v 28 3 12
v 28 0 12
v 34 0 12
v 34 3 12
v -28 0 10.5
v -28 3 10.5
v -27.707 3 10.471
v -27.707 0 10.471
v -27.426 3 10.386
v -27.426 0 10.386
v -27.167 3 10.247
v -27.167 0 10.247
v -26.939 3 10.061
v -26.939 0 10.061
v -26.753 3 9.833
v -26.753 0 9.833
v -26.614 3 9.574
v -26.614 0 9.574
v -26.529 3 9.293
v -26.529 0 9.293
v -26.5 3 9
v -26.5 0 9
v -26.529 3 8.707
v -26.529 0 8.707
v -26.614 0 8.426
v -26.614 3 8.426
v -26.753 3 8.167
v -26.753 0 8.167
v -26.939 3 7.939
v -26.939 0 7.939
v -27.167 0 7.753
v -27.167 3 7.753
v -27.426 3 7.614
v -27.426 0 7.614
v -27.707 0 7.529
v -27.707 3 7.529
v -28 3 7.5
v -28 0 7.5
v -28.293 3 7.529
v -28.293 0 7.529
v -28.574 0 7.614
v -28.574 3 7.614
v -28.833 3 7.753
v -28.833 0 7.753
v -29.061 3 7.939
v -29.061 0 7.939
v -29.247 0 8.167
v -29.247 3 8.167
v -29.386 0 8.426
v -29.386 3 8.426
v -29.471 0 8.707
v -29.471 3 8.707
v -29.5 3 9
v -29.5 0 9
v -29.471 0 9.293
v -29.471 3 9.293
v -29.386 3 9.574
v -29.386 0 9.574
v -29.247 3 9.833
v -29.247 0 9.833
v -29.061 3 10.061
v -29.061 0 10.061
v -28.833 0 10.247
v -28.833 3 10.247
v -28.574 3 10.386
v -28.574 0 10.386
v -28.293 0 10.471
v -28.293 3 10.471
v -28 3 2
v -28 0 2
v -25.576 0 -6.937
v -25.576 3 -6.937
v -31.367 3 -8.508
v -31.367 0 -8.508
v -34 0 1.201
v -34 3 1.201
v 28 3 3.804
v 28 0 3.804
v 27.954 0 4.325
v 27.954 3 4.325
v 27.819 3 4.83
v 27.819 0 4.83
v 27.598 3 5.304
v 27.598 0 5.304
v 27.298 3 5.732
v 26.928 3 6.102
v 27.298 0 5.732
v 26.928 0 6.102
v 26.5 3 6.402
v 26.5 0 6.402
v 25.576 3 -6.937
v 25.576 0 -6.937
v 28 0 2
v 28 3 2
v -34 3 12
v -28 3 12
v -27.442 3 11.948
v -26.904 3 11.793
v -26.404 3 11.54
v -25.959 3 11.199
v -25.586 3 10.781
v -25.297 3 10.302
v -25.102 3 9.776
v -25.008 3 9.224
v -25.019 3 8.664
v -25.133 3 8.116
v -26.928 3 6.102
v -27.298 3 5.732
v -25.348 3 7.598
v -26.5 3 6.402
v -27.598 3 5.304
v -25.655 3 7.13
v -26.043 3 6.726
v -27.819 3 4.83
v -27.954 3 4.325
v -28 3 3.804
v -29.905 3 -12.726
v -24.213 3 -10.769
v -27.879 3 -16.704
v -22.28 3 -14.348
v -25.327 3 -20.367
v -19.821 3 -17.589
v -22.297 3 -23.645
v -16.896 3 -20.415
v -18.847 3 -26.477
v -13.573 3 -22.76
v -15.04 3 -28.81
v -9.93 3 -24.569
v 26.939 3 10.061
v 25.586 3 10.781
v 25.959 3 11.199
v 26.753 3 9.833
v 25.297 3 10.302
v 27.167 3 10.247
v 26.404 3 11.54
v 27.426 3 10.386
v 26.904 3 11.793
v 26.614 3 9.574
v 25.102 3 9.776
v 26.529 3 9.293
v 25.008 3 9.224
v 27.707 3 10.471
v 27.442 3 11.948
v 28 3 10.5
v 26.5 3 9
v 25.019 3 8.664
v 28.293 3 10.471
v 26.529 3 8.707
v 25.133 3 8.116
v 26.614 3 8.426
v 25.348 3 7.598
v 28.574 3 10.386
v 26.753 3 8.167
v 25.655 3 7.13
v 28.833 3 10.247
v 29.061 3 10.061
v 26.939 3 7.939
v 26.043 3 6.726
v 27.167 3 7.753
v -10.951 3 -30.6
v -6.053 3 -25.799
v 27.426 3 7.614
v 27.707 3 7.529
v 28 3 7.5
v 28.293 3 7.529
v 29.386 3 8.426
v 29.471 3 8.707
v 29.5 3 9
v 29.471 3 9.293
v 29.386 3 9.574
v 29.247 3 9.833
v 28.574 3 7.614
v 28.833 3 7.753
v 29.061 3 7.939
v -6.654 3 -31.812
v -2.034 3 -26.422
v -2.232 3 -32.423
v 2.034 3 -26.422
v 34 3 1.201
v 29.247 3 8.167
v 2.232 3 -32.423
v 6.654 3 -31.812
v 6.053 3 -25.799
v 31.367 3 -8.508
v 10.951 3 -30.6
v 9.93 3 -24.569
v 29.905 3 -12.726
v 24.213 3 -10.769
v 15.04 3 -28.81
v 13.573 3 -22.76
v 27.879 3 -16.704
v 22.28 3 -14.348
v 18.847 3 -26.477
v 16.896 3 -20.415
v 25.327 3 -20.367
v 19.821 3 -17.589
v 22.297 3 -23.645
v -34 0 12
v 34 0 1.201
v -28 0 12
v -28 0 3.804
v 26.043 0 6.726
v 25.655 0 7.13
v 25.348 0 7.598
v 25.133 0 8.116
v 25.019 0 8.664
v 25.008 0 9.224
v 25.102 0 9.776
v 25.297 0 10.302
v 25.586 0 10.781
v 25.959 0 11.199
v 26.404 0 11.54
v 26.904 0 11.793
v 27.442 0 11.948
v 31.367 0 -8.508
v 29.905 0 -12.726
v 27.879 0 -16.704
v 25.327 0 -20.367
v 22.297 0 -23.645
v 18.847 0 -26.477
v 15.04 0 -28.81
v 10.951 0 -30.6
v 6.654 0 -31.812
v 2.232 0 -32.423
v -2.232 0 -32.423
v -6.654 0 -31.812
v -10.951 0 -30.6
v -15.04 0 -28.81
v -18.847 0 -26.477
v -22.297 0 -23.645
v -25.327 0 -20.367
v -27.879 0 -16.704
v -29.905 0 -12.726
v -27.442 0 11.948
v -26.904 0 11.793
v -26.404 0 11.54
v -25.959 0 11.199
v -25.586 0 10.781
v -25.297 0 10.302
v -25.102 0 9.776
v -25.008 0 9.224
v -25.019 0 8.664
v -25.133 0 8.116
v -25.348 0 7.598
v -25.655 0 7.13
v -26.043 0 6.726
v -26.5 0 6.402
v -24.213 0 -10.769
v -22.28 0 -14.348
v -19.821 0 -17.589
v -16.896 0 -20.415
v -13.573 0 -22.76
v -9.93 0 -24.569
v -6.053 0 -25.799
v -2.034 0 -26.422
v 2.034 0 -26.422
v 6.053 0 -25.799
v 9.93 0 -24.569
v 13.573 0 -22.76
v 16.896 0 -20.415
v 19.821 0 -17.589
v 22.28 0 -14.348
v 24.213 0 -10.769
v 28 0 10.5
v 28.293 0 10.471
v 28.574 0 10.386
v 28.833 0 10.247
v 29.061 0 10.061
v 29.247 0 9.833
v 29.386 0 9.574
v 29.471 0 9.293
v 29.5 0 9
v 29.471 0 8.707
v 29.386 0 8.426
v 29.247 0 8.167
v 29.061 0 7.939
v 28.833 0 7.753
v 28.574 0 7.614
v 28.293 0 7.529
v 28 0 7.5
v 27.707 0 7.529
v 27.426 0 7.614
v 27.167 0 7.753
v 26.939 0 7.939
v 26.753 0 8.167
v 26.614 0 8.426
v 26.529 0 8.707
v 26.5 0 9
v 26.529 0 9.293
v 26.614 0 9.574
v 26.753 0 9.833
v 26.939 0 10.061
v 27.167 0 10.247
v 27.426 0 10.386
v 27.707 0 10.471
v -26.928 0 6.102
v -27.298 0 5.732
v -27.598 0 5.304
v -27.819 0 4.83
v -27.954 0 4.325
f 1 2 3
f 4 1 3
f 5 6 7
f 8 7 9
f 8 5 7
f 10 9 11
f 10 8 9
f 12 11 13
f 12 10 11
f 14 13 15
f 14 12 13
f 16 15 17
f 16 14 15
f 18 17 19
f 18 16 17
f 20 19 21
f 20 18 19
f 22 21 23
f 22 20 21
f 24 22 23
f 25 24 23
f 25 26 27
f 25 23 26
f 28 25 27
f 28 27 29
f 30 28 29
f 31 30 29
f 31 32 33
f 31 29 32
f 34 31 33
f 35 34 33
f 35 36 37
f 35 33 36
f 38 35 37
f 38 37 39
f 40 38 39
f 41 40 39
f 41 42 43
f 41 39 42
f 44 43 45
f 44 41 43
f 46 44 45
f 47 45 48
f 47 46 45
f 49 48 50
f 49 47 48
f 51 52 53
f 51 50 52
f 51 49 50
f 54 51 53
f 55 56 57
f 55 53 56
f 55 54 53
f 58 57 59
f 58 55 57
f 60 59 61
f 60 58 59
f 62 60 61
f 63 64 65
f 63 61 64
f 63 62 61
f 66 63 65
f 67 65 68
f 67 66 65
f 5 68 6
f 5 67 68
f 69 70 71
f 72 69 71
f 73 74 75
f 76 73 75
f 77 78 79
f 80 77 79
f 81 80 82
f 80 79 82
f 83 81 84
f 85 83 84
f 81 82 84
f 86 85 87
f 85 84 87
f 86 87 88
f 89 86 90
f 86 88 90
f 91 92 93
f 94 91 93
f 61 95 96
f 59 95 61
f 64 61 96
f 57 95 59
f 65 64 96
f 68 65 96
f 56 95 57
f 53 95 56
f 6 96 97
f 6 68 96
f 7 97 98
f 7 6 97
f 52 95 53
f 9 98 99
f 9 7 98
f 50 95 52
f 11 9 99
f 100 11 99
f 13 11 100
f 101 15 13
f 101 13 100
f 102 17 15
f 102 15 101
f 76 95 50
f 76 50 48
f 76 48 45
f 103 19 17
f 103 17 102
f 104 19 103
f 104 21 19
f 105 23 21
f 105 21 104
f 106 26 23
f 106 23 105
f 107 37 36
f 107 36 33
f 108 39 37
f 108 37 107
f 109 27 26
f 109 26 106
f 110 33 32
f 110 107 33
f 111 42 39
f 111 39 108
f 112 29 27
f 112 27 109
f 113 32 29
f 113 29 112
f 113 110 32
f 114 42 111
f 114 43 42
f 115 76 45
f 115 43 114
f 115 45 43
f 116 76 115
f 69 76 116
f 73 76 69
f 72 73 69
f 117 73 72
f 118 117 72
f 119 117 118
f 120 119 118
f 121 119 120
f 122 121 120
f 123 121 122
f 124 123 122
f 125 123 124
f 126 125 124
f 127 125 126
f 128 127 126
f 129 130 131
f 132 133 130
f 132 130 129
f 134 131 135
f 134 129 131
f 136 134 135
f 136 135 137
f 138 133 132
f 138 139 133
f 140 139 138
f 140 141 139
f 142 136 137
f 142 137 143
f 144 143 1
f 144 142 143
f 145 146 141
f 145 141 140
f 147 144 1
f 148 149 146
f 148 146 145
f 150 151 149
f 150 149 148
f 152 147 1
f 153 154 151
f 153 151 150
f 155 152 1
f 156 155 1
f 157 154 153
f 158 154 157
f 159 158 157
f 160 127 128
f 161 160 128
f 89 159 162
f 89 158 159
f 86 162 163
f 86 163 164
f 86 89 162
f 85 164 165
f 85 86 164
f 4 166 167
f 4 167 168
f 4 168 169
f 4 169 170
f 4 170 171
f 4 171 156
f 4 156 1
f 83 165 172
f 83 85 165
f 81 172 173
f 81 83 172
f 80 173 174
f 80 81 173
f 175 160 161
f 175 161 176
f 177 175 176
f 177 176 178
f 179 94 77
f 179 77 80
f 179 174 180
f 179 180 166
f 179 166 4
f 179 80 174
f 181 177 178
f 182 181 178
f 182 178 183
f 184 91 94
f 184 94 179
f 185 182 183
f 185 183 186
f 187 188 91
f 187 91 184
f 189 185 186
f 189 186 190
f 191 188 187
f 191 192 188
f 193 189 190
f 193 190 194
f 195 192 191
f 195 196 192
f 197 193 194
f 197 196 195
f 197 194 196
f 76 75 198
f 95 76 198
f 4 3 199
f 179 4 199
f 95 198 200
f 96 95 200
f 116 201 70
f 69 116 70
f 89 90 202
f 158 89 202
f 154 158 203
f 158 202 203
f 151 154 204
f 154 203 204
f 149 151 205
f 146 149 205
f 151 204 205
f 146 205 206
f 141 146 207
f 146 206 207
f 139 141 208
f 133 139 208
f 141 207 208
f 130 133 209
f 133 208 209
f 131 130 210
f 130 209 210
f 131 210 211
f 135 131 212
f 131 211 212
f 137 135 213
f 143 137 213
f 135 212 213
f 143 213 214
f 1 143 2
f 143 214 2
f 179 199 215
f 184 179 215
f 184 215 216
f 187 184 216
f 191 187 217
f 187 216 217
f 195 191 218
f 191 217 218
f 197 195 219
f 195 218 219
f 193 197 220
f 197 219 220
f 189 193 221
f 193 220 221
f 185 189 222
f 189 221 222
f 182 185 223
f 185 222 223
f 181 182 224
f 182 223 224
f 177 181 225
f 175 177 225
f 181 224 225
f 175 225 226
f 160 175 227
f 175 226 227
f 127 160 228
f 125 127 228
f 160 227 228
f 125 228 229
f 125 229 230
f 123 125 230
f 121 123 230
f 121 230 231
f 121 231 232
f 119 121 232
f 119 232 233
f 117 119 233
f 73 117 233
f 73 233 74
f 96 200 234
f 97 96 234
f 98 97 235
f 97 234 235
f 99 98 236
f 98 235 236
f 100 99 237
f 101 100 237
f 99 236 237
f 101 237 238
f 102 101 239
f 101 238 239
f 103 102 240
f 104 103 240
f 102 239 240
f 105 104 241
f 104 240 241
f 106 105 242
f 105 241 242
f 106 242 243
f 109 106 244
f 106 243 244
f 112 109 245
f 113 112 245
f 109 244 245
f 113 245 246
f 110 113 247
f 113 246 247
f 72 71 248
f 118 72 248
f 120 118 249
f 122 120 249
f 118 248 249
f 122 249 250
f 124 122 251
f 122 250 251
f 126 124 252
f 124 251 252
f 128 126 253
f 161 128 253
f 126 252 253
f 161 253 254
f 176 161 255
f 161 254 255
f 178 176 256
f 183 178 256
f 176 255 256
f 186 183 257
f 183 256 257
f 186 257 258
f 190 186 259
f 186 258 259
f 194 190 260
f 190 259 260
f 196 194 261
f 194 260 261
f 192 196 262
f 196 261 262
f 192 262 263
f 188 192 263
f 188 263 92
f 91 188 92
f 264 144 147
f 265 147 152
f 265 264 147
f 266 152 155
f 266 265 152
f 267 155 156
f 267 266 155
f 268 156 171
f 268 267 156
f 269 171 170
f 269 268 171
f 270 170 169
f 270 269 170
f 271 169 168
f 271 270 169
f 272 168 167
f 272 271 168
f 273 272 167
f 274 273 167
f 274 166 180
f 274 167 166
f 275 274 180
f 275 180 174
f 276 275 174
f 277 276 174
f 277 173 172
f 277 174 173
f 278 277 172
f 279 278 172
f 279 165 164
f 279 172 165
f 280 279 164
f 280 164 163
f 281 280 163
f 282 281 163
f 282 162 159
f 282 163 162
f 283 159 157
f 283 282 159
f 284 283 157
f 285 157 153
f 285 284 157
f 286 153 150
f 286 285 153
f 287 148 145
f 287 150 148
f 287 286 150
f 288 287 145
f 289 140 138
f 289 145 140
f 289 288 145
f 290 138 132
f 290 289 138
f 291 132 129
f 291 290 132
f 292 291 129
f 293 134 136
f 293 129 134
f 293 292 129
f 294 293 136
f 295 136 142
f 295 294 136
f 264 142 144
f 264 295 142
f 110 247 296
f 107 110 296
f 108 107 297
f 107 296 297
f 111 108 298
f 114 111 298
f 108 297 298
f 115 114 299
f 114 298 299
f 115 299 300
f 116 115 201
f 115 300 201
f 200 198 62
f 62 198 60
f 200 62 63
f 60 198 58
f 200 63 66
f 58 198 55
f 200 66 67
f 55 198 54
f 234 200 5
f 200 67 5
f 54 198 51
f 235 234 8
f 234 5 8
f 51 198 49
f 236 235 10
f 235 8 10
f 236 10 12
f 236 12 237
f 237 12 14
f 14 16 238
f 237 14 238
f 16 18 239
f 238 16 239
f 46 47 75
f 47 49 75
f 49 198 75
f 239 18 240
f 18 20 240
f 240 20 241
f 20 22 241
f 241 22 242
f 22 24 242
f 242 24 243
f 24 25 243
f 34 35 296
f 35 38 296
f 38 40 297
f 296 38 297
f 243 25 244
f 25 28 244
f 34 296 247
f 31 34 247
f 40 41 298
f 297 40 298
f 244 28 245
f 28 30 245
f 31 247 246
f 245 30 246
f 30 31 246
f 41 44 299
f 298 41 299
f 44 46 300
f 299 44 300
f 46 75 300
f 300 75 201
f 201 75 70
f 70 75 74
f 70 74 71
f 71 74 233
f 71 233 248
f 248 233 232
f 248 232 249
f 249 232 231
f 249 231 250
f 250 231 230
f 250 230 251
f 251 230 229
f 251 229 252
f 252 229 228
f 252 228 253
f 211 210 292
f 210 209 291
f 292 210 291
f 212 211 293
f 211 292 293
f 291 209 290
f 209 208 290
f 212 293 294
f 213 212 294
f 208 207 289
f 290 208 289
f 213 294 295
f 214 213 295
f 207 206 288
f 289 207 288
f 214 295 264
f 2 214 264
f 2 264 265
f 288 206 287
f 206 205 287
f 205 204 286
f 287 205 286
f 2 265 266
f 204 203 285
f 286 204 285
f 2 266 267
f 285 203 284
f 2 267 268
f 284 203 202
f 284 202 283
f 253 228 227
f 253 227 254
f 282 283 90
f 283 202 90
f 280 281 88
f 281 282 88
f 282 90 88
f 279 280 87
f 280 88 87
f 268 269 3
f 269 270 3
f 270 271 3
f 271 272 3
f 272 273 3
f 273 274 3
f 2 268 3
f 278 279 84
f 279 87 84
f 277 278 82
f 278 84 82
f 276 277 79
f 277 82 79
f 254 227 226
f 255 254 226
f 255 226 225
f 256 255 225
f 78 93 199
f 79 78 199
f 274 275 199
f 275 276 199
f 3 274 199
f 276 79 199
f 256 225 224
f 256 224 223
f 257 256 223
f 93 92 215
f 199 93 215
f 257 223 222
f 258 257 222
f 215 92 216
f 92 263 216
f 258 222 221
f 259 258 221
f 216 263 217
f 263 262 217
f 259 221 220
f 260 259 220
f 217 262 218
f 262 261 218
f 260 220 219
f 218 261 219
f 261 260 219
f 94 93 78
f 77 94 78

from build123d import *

# Parameters (mm, degrees)
EYELID_OUTLINE_R   = 1.25
EYELID_DEPTH       = 3
SKETCH1_R          = 1.5
SKETCH1_W          = 68
SKETCH1_H          = 13
CUT_EXTRUDE1_DEPTH = 48.130138977


# Read off the part's stored shape, not the designer's step: eyelid
with BuildPart() as part:
    # eyelid outline → eyelid (new body)
    with BuildSketch(Plane(origin=(0, 0, 0), x_dir=(1, 0, 0), z_dir=(0, 1, 0))):
        with BuildLine():
            Line((28, -2), (28, -3.803847577))
            ThreePointArc((28, -3.803847577), (27.598076211, -5.303847577), (26.5, -6.401923789))
            ThreePointArc((26.5, -6.401923789), (25.102222521, -9.776457136), (28, -12))
            Line((28, -12), (29.1, -12))
            Line((29.1, -12), (29.1, -16))
            Line((29.1, -16), (30.9, -25))
            Line((30.9, -25), (32.4, -25))
            Line((32.4, -25), (33.9, -23.5))
            Line((33.9, -23.5), (33.9, -22.5))
            Line((33.9, -22.5), (33.4, -22))
            Line((33.4, -22), (32.9, -21))
            Line((32.9, -21), (32.9, -12))
            Line((32.9, -12), (34, -12))
            Line((34, -12), (34, -1.200719678))
            Line((34, -1.200719678), (31.366635055, 8.507890769))
            ThreePointArc((31.366635055, 8.507890769), (0, 32.5), (-31.366635055, 8.507890769))
            Line((-31.366635055, 8.507890769), (-34, -1.200719678))
            Line((-34, -1.200719678), (-34, -12))
            Line((-34, -12), (-32.9, -12))
            Line((-32.9, -12), (-32.9, -21))
            Line((-32.9, -21), (-33.4, -22))
            Line((-33.4, -22), (-33.9, -22.5))
            Line((-33.9, -22.5), (-33.9, -23.5))
            Line((-33.9, -23.5), (-32.4, -25))
            Line((-32.4, -25), (-30.9, -25))
            Line((-30.9, -25), (-29.1, -16))
            Line((-29.1, -16), (-29.1, -12))
            Line((-29.1, -12), (-28, -12))
            ThreePointArc((-28, -12), (-25.102222521, -9.776457136), (-26.5, -6.401923789))
            ThreePointArc((-26.5, -6.401923789), (-27.598076211, -5.303847577), (-28, -3.803847577))
            Line((-28, -3.803847577), (-28, -2))
            Line((-28, -2), (-25.57587166, 6.937203242))
            ThreePointArc((-25.57587166, 6.937203242), (0, 26.5), (25.57587166, 6.937203242))
            Line((25.57587166, 6.937203242), (28, -2))
        make_face()
        with Locations((-28, -9)):
            Circle(EYELID_OUTLINE_R, mode=Mode.SUBTRACT)
        with Locations((28, -9)):
            Circle(EYELID_OUTLINE_R, mode=Mode.SUBTRACT)
    extrude(amount=EYELID_DEPTH)

    # Sketch1 → Cut-Extrude1 (cut, through all)
    with BuildSketch(Plane(origin=(0, 0, 0), x_dir=(1, 0, 0), z_dir=(0, 1, 0))):
        with Locations(Location((-28, -9, 0), (0, 0, 270))):
            Circle(SKETCH1_R)
        with Locations(Location((28, -9, 0), (0, 0, 270))):
            Circle(SKETCH1_R)
        with Locations((0, -18.5)):
            Rectangle(SKETCH1_W, SKETCH1_H)
    extrude(amount=CUT_EXTRUDE1_DEPTH, mode=Mode.SUBTRACT)


solid = part.part
